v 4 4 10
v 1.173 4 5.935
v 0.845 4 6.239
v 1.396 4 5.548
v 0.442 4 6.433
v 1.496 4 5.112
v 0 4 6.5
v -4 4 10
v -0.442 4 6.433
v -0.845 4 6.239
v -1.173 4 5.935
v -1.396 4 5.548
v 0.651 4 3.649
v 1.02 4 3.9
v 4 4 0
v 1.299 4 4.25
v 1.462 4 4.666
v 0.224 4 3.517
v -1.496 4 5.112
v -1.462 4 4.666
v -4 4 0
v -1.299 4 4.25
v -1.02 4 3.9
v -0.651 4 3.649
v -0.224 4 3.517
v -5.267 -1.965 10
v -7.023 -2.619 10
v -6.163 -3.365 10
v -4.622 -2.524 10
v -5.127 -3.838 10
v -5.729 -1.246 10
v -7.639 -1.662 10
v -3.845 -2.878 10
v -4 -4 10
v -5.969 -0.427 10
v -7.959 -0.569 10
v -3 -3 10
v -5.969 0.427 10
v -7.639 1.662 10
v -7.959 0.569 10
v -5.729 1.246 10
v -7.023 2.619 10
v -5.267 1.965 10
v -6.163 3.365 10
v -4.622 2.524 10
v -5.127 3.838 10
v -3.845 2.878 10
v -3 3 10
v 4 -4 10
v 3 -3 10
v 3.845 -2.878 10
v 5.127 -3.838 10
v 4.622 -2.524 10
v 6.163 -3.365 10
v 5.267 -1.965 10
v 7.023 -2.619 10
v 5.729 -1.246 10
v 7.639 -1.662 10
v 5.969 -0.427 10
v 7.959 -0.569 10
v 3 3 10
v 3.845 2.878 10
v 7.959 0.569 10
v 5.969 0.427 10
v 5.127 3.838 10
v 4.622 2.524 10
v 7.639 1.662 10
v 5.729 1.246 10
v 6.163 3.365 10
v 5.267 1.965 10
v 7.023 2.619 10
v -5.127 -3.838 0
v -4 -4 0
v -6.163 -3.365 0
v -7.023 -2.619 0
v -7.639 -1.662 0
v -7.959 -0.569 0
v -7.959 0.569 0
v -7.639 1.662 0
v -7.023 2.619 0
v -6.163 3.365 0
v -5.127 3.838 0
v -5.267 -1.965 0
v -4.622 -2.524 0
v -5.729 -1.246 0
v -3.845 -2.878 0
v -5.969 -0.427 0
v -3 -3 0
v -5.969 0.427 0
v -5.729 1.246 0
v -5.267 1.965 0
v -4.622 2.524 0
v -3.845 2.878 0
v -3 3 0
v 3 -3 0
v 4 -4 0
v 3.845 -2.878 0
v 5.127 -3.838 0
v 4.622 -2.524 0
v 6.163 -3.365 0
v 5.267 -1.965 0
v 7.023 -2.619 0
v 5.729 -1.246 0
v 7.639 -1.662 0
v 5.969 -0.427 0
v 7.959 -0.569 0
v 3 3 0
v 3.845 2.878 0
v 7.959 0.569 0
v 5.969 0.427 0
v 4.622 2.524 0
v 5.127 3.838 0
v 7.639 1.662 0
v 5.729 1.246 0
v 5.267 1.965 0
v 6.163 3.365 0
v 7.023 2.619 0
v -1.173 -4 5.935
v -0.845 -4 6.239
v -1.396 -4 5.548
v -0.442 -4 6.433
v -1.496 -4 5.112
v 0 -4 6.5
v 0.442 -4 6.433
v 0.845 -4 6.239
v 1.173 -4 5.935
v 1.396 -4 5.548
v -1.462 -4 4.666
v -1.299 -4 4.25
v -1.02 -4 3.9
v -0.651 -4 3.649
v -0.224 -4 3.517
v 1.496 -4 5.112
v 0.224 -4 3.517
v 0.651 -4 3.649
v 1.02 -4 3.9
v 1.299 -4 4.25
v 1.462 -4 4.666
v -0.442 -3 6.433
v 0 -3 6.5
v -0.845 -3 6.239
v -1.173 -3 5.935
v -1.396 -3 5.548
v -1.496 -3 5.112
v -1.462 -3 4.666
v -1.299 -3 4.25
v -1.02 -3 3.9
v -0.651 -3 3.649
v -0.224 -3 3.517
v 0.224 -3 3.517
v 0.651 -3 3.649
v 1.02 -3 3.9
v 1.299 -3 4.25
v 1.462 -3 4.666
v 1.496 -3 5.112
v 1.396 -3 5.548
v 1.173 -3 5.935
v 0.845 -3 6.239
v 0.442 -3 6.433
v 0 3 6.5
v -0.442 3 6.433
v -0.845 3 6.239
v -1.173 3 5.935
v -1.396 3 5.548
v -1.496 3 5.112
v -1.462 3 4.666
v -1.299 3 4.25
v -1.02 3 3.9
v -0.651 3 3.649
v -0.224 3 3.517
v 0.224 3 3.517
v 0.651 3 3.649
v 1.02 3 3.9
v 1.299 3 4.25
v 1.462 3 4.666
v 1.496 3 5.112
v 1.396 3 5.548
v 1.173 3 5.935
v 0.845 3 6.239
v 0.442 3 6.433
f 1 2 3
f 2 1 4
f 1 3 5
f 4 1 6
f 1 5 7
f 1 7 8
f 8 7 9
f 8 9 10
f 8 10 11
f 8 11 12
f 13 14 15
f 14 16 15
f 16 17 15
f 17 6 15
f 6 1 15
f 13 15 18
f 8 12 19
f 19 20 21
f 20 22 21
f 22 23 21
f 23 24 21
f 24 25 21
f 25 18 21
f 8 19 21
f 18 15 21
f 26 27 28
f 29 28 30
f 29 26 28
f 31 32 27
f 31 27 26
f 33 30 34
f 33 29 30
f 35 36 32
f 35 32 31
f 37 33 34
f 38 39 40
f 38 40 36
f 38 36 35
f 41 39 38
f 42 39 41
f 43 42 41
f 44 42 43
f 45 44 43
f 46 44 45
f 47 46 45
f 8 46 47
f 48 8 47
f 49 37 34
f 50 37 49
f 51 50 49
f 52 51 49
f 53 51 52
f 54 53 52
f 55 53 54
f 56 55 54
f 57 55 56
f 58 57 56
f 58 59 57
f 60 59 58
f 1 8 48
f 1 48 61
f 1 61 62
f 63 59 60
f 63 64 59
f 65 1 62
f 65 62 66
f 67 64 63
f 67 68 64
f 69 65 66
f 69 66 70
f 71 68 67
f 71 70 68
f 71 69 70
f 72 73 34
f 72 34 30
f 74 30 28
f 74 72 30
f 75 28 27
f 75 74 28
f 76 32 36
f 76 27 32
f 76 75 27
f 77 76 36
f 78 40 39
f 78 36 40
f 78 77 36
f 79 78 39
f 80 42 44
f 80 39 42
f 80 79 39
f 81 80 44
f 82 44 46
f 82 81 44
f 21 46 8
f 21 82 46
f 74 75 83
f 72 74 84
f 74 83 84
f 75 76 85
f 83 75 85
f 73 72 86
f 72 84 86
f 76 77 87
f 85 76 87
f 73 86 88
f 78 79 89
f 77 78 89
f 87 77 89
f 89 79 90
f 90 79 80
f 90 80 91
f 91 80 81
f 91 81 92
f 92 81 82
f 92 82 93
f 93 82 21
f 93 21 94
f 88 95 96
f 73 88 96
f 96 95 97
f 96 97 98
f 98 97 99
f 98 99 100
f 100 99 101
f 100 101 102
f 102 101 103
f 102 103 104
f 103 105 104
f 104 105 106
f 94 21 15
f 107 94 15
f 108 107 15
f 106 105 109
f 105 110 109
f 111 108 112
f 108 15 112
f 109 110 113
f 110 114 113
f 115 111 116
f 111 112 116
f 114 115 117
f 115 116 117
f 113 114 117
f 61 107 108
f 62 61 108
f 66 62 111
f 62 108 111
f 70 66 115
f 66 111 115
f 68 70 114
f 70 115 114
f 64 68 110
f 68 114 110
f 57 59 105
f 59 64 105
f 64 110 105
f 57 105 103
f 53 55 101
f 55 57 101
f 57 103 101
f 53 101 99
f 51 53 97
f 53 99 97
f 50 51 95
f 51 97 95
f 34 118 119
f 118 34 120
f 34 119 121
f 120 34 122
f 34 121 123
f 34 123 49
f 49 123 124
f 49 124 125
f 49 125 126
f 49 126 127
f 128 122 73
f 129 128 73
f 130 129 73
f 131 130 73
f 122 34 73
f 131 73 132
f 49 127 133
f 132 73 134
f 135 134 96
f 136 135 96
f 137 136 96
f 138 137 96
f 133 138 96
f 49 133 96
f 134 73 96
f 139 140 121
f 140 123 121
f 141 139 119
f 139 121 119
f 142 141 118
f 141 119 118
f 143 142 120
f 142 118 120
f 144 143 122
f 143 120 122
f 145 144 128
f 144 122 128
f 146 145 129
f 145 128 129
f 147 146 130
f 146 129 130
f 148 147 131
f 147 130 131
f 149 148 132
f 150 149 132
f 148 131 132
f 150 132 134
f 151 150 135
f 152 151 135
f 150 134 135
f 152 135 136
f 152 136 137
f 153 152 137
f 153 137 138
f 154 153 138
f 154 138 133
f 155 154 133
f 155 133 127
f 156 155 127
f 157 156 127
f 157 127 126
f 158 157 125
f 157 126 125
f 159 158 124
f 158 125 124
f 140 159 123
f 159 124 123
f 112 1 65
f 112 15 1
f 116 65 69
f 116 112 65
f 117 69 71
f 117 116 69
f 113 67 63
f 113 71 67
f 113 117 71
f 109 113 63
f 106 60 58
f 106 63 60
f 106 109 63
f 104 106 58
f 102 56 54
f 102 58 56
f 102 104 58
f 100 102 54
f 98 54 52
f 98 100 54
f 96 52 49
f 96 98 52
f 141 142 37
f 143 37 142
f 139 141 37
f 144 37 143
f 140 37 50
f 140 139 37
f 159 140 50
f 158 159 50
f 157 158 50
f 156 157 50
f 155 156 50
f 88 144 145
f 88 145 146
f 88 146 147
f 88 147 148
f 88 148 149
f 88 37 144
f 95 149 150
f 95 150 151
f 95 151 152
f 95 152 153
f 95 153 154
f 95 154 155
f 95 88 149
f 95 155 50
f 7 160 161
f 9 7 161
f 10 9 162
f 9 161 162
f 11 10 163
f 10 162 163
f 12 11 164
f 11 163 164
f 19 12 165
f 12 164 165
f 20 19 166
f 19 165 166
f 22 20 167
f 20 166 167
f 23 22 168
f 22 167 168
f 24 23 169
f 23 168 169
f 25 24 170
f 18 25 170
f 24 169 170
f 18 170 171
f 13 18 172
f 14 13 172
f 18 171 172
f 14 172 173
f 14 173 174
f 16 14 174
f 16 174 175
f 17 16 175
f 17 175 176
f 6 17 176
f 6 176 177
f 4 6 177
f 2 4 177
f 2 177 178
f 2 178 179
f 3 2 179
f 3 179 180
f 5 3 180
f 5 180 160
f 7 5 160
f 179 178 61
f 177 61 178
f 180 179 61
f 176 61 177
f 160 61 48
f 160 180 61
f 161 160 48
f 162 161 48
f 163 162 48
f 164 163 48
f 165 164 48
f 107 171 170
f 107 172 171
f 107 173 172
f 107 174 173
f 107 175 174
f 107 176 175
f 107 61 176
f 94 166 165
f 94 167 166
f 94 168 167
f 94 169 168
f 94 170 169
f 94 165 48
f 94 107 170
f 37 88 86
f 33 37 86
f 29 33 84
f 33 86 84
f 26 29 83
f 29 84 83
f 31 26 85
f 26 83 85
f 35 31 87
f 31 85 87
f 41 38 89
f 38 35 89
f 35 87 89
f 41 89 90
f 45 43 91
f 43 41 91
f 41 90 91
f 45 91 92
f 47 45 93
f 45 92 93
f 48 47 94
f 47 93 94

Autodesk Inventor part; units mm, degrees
ref_plane "YZ Plane" through (0, 0, 0) normal (1, 0, 0) x (0, 1, 0)
ref_plane "XZ Plane" through (0, 0, 0) normal (0, 1, 0) x (-1, 0, 0)
ref_plane "XY Plane" through (0, 0, 0) normal (0, 0, 1) x (1, 0, 0)
sketch "Sketch1" plane through (0, 0, 0) normal (0, 0, 1) x (1, 0, 0)
  line L0 (-4, 0) -> (4, 0) construction
  line L1 (-4, -4) -> (4, -4)
  line L2 (4, 4) -> (-4, 4)
  arc A0 (-4, 4) -> (-4, -4) centre (-4, 0) ccw
  arc A1 (4, -4) -> (4, 4) centre (4, 0) ccw
  line L3 (-3, 0) -> (3, 0) construction
  line L4 (-3, -3) -> (3, -3)
  line L5 (3, 3) -> (-3, 3)
  arc A2 (-3, 3) -> (-3, -3) centre (-3, 0) ccw
  arc A3 (3, -3) -> (3, 3) centre (3, 0) ccw
  point P0 (0, 0)
extrude "Extrusion1" add sketch "Sketch1" along normal blind 10
sketch "Sketch2" plane through (-4, 4, 0) normal (0, 1, 0) x (1, 0, 0)
  point P0 (4, 0)
  point P1 (4, -5)
hole "Hole1" at (0, 4, 5) direction (0, -1, 0) diameter 3 end through all
properties part number "silicon_tube" material "Rubber, Silicone"
